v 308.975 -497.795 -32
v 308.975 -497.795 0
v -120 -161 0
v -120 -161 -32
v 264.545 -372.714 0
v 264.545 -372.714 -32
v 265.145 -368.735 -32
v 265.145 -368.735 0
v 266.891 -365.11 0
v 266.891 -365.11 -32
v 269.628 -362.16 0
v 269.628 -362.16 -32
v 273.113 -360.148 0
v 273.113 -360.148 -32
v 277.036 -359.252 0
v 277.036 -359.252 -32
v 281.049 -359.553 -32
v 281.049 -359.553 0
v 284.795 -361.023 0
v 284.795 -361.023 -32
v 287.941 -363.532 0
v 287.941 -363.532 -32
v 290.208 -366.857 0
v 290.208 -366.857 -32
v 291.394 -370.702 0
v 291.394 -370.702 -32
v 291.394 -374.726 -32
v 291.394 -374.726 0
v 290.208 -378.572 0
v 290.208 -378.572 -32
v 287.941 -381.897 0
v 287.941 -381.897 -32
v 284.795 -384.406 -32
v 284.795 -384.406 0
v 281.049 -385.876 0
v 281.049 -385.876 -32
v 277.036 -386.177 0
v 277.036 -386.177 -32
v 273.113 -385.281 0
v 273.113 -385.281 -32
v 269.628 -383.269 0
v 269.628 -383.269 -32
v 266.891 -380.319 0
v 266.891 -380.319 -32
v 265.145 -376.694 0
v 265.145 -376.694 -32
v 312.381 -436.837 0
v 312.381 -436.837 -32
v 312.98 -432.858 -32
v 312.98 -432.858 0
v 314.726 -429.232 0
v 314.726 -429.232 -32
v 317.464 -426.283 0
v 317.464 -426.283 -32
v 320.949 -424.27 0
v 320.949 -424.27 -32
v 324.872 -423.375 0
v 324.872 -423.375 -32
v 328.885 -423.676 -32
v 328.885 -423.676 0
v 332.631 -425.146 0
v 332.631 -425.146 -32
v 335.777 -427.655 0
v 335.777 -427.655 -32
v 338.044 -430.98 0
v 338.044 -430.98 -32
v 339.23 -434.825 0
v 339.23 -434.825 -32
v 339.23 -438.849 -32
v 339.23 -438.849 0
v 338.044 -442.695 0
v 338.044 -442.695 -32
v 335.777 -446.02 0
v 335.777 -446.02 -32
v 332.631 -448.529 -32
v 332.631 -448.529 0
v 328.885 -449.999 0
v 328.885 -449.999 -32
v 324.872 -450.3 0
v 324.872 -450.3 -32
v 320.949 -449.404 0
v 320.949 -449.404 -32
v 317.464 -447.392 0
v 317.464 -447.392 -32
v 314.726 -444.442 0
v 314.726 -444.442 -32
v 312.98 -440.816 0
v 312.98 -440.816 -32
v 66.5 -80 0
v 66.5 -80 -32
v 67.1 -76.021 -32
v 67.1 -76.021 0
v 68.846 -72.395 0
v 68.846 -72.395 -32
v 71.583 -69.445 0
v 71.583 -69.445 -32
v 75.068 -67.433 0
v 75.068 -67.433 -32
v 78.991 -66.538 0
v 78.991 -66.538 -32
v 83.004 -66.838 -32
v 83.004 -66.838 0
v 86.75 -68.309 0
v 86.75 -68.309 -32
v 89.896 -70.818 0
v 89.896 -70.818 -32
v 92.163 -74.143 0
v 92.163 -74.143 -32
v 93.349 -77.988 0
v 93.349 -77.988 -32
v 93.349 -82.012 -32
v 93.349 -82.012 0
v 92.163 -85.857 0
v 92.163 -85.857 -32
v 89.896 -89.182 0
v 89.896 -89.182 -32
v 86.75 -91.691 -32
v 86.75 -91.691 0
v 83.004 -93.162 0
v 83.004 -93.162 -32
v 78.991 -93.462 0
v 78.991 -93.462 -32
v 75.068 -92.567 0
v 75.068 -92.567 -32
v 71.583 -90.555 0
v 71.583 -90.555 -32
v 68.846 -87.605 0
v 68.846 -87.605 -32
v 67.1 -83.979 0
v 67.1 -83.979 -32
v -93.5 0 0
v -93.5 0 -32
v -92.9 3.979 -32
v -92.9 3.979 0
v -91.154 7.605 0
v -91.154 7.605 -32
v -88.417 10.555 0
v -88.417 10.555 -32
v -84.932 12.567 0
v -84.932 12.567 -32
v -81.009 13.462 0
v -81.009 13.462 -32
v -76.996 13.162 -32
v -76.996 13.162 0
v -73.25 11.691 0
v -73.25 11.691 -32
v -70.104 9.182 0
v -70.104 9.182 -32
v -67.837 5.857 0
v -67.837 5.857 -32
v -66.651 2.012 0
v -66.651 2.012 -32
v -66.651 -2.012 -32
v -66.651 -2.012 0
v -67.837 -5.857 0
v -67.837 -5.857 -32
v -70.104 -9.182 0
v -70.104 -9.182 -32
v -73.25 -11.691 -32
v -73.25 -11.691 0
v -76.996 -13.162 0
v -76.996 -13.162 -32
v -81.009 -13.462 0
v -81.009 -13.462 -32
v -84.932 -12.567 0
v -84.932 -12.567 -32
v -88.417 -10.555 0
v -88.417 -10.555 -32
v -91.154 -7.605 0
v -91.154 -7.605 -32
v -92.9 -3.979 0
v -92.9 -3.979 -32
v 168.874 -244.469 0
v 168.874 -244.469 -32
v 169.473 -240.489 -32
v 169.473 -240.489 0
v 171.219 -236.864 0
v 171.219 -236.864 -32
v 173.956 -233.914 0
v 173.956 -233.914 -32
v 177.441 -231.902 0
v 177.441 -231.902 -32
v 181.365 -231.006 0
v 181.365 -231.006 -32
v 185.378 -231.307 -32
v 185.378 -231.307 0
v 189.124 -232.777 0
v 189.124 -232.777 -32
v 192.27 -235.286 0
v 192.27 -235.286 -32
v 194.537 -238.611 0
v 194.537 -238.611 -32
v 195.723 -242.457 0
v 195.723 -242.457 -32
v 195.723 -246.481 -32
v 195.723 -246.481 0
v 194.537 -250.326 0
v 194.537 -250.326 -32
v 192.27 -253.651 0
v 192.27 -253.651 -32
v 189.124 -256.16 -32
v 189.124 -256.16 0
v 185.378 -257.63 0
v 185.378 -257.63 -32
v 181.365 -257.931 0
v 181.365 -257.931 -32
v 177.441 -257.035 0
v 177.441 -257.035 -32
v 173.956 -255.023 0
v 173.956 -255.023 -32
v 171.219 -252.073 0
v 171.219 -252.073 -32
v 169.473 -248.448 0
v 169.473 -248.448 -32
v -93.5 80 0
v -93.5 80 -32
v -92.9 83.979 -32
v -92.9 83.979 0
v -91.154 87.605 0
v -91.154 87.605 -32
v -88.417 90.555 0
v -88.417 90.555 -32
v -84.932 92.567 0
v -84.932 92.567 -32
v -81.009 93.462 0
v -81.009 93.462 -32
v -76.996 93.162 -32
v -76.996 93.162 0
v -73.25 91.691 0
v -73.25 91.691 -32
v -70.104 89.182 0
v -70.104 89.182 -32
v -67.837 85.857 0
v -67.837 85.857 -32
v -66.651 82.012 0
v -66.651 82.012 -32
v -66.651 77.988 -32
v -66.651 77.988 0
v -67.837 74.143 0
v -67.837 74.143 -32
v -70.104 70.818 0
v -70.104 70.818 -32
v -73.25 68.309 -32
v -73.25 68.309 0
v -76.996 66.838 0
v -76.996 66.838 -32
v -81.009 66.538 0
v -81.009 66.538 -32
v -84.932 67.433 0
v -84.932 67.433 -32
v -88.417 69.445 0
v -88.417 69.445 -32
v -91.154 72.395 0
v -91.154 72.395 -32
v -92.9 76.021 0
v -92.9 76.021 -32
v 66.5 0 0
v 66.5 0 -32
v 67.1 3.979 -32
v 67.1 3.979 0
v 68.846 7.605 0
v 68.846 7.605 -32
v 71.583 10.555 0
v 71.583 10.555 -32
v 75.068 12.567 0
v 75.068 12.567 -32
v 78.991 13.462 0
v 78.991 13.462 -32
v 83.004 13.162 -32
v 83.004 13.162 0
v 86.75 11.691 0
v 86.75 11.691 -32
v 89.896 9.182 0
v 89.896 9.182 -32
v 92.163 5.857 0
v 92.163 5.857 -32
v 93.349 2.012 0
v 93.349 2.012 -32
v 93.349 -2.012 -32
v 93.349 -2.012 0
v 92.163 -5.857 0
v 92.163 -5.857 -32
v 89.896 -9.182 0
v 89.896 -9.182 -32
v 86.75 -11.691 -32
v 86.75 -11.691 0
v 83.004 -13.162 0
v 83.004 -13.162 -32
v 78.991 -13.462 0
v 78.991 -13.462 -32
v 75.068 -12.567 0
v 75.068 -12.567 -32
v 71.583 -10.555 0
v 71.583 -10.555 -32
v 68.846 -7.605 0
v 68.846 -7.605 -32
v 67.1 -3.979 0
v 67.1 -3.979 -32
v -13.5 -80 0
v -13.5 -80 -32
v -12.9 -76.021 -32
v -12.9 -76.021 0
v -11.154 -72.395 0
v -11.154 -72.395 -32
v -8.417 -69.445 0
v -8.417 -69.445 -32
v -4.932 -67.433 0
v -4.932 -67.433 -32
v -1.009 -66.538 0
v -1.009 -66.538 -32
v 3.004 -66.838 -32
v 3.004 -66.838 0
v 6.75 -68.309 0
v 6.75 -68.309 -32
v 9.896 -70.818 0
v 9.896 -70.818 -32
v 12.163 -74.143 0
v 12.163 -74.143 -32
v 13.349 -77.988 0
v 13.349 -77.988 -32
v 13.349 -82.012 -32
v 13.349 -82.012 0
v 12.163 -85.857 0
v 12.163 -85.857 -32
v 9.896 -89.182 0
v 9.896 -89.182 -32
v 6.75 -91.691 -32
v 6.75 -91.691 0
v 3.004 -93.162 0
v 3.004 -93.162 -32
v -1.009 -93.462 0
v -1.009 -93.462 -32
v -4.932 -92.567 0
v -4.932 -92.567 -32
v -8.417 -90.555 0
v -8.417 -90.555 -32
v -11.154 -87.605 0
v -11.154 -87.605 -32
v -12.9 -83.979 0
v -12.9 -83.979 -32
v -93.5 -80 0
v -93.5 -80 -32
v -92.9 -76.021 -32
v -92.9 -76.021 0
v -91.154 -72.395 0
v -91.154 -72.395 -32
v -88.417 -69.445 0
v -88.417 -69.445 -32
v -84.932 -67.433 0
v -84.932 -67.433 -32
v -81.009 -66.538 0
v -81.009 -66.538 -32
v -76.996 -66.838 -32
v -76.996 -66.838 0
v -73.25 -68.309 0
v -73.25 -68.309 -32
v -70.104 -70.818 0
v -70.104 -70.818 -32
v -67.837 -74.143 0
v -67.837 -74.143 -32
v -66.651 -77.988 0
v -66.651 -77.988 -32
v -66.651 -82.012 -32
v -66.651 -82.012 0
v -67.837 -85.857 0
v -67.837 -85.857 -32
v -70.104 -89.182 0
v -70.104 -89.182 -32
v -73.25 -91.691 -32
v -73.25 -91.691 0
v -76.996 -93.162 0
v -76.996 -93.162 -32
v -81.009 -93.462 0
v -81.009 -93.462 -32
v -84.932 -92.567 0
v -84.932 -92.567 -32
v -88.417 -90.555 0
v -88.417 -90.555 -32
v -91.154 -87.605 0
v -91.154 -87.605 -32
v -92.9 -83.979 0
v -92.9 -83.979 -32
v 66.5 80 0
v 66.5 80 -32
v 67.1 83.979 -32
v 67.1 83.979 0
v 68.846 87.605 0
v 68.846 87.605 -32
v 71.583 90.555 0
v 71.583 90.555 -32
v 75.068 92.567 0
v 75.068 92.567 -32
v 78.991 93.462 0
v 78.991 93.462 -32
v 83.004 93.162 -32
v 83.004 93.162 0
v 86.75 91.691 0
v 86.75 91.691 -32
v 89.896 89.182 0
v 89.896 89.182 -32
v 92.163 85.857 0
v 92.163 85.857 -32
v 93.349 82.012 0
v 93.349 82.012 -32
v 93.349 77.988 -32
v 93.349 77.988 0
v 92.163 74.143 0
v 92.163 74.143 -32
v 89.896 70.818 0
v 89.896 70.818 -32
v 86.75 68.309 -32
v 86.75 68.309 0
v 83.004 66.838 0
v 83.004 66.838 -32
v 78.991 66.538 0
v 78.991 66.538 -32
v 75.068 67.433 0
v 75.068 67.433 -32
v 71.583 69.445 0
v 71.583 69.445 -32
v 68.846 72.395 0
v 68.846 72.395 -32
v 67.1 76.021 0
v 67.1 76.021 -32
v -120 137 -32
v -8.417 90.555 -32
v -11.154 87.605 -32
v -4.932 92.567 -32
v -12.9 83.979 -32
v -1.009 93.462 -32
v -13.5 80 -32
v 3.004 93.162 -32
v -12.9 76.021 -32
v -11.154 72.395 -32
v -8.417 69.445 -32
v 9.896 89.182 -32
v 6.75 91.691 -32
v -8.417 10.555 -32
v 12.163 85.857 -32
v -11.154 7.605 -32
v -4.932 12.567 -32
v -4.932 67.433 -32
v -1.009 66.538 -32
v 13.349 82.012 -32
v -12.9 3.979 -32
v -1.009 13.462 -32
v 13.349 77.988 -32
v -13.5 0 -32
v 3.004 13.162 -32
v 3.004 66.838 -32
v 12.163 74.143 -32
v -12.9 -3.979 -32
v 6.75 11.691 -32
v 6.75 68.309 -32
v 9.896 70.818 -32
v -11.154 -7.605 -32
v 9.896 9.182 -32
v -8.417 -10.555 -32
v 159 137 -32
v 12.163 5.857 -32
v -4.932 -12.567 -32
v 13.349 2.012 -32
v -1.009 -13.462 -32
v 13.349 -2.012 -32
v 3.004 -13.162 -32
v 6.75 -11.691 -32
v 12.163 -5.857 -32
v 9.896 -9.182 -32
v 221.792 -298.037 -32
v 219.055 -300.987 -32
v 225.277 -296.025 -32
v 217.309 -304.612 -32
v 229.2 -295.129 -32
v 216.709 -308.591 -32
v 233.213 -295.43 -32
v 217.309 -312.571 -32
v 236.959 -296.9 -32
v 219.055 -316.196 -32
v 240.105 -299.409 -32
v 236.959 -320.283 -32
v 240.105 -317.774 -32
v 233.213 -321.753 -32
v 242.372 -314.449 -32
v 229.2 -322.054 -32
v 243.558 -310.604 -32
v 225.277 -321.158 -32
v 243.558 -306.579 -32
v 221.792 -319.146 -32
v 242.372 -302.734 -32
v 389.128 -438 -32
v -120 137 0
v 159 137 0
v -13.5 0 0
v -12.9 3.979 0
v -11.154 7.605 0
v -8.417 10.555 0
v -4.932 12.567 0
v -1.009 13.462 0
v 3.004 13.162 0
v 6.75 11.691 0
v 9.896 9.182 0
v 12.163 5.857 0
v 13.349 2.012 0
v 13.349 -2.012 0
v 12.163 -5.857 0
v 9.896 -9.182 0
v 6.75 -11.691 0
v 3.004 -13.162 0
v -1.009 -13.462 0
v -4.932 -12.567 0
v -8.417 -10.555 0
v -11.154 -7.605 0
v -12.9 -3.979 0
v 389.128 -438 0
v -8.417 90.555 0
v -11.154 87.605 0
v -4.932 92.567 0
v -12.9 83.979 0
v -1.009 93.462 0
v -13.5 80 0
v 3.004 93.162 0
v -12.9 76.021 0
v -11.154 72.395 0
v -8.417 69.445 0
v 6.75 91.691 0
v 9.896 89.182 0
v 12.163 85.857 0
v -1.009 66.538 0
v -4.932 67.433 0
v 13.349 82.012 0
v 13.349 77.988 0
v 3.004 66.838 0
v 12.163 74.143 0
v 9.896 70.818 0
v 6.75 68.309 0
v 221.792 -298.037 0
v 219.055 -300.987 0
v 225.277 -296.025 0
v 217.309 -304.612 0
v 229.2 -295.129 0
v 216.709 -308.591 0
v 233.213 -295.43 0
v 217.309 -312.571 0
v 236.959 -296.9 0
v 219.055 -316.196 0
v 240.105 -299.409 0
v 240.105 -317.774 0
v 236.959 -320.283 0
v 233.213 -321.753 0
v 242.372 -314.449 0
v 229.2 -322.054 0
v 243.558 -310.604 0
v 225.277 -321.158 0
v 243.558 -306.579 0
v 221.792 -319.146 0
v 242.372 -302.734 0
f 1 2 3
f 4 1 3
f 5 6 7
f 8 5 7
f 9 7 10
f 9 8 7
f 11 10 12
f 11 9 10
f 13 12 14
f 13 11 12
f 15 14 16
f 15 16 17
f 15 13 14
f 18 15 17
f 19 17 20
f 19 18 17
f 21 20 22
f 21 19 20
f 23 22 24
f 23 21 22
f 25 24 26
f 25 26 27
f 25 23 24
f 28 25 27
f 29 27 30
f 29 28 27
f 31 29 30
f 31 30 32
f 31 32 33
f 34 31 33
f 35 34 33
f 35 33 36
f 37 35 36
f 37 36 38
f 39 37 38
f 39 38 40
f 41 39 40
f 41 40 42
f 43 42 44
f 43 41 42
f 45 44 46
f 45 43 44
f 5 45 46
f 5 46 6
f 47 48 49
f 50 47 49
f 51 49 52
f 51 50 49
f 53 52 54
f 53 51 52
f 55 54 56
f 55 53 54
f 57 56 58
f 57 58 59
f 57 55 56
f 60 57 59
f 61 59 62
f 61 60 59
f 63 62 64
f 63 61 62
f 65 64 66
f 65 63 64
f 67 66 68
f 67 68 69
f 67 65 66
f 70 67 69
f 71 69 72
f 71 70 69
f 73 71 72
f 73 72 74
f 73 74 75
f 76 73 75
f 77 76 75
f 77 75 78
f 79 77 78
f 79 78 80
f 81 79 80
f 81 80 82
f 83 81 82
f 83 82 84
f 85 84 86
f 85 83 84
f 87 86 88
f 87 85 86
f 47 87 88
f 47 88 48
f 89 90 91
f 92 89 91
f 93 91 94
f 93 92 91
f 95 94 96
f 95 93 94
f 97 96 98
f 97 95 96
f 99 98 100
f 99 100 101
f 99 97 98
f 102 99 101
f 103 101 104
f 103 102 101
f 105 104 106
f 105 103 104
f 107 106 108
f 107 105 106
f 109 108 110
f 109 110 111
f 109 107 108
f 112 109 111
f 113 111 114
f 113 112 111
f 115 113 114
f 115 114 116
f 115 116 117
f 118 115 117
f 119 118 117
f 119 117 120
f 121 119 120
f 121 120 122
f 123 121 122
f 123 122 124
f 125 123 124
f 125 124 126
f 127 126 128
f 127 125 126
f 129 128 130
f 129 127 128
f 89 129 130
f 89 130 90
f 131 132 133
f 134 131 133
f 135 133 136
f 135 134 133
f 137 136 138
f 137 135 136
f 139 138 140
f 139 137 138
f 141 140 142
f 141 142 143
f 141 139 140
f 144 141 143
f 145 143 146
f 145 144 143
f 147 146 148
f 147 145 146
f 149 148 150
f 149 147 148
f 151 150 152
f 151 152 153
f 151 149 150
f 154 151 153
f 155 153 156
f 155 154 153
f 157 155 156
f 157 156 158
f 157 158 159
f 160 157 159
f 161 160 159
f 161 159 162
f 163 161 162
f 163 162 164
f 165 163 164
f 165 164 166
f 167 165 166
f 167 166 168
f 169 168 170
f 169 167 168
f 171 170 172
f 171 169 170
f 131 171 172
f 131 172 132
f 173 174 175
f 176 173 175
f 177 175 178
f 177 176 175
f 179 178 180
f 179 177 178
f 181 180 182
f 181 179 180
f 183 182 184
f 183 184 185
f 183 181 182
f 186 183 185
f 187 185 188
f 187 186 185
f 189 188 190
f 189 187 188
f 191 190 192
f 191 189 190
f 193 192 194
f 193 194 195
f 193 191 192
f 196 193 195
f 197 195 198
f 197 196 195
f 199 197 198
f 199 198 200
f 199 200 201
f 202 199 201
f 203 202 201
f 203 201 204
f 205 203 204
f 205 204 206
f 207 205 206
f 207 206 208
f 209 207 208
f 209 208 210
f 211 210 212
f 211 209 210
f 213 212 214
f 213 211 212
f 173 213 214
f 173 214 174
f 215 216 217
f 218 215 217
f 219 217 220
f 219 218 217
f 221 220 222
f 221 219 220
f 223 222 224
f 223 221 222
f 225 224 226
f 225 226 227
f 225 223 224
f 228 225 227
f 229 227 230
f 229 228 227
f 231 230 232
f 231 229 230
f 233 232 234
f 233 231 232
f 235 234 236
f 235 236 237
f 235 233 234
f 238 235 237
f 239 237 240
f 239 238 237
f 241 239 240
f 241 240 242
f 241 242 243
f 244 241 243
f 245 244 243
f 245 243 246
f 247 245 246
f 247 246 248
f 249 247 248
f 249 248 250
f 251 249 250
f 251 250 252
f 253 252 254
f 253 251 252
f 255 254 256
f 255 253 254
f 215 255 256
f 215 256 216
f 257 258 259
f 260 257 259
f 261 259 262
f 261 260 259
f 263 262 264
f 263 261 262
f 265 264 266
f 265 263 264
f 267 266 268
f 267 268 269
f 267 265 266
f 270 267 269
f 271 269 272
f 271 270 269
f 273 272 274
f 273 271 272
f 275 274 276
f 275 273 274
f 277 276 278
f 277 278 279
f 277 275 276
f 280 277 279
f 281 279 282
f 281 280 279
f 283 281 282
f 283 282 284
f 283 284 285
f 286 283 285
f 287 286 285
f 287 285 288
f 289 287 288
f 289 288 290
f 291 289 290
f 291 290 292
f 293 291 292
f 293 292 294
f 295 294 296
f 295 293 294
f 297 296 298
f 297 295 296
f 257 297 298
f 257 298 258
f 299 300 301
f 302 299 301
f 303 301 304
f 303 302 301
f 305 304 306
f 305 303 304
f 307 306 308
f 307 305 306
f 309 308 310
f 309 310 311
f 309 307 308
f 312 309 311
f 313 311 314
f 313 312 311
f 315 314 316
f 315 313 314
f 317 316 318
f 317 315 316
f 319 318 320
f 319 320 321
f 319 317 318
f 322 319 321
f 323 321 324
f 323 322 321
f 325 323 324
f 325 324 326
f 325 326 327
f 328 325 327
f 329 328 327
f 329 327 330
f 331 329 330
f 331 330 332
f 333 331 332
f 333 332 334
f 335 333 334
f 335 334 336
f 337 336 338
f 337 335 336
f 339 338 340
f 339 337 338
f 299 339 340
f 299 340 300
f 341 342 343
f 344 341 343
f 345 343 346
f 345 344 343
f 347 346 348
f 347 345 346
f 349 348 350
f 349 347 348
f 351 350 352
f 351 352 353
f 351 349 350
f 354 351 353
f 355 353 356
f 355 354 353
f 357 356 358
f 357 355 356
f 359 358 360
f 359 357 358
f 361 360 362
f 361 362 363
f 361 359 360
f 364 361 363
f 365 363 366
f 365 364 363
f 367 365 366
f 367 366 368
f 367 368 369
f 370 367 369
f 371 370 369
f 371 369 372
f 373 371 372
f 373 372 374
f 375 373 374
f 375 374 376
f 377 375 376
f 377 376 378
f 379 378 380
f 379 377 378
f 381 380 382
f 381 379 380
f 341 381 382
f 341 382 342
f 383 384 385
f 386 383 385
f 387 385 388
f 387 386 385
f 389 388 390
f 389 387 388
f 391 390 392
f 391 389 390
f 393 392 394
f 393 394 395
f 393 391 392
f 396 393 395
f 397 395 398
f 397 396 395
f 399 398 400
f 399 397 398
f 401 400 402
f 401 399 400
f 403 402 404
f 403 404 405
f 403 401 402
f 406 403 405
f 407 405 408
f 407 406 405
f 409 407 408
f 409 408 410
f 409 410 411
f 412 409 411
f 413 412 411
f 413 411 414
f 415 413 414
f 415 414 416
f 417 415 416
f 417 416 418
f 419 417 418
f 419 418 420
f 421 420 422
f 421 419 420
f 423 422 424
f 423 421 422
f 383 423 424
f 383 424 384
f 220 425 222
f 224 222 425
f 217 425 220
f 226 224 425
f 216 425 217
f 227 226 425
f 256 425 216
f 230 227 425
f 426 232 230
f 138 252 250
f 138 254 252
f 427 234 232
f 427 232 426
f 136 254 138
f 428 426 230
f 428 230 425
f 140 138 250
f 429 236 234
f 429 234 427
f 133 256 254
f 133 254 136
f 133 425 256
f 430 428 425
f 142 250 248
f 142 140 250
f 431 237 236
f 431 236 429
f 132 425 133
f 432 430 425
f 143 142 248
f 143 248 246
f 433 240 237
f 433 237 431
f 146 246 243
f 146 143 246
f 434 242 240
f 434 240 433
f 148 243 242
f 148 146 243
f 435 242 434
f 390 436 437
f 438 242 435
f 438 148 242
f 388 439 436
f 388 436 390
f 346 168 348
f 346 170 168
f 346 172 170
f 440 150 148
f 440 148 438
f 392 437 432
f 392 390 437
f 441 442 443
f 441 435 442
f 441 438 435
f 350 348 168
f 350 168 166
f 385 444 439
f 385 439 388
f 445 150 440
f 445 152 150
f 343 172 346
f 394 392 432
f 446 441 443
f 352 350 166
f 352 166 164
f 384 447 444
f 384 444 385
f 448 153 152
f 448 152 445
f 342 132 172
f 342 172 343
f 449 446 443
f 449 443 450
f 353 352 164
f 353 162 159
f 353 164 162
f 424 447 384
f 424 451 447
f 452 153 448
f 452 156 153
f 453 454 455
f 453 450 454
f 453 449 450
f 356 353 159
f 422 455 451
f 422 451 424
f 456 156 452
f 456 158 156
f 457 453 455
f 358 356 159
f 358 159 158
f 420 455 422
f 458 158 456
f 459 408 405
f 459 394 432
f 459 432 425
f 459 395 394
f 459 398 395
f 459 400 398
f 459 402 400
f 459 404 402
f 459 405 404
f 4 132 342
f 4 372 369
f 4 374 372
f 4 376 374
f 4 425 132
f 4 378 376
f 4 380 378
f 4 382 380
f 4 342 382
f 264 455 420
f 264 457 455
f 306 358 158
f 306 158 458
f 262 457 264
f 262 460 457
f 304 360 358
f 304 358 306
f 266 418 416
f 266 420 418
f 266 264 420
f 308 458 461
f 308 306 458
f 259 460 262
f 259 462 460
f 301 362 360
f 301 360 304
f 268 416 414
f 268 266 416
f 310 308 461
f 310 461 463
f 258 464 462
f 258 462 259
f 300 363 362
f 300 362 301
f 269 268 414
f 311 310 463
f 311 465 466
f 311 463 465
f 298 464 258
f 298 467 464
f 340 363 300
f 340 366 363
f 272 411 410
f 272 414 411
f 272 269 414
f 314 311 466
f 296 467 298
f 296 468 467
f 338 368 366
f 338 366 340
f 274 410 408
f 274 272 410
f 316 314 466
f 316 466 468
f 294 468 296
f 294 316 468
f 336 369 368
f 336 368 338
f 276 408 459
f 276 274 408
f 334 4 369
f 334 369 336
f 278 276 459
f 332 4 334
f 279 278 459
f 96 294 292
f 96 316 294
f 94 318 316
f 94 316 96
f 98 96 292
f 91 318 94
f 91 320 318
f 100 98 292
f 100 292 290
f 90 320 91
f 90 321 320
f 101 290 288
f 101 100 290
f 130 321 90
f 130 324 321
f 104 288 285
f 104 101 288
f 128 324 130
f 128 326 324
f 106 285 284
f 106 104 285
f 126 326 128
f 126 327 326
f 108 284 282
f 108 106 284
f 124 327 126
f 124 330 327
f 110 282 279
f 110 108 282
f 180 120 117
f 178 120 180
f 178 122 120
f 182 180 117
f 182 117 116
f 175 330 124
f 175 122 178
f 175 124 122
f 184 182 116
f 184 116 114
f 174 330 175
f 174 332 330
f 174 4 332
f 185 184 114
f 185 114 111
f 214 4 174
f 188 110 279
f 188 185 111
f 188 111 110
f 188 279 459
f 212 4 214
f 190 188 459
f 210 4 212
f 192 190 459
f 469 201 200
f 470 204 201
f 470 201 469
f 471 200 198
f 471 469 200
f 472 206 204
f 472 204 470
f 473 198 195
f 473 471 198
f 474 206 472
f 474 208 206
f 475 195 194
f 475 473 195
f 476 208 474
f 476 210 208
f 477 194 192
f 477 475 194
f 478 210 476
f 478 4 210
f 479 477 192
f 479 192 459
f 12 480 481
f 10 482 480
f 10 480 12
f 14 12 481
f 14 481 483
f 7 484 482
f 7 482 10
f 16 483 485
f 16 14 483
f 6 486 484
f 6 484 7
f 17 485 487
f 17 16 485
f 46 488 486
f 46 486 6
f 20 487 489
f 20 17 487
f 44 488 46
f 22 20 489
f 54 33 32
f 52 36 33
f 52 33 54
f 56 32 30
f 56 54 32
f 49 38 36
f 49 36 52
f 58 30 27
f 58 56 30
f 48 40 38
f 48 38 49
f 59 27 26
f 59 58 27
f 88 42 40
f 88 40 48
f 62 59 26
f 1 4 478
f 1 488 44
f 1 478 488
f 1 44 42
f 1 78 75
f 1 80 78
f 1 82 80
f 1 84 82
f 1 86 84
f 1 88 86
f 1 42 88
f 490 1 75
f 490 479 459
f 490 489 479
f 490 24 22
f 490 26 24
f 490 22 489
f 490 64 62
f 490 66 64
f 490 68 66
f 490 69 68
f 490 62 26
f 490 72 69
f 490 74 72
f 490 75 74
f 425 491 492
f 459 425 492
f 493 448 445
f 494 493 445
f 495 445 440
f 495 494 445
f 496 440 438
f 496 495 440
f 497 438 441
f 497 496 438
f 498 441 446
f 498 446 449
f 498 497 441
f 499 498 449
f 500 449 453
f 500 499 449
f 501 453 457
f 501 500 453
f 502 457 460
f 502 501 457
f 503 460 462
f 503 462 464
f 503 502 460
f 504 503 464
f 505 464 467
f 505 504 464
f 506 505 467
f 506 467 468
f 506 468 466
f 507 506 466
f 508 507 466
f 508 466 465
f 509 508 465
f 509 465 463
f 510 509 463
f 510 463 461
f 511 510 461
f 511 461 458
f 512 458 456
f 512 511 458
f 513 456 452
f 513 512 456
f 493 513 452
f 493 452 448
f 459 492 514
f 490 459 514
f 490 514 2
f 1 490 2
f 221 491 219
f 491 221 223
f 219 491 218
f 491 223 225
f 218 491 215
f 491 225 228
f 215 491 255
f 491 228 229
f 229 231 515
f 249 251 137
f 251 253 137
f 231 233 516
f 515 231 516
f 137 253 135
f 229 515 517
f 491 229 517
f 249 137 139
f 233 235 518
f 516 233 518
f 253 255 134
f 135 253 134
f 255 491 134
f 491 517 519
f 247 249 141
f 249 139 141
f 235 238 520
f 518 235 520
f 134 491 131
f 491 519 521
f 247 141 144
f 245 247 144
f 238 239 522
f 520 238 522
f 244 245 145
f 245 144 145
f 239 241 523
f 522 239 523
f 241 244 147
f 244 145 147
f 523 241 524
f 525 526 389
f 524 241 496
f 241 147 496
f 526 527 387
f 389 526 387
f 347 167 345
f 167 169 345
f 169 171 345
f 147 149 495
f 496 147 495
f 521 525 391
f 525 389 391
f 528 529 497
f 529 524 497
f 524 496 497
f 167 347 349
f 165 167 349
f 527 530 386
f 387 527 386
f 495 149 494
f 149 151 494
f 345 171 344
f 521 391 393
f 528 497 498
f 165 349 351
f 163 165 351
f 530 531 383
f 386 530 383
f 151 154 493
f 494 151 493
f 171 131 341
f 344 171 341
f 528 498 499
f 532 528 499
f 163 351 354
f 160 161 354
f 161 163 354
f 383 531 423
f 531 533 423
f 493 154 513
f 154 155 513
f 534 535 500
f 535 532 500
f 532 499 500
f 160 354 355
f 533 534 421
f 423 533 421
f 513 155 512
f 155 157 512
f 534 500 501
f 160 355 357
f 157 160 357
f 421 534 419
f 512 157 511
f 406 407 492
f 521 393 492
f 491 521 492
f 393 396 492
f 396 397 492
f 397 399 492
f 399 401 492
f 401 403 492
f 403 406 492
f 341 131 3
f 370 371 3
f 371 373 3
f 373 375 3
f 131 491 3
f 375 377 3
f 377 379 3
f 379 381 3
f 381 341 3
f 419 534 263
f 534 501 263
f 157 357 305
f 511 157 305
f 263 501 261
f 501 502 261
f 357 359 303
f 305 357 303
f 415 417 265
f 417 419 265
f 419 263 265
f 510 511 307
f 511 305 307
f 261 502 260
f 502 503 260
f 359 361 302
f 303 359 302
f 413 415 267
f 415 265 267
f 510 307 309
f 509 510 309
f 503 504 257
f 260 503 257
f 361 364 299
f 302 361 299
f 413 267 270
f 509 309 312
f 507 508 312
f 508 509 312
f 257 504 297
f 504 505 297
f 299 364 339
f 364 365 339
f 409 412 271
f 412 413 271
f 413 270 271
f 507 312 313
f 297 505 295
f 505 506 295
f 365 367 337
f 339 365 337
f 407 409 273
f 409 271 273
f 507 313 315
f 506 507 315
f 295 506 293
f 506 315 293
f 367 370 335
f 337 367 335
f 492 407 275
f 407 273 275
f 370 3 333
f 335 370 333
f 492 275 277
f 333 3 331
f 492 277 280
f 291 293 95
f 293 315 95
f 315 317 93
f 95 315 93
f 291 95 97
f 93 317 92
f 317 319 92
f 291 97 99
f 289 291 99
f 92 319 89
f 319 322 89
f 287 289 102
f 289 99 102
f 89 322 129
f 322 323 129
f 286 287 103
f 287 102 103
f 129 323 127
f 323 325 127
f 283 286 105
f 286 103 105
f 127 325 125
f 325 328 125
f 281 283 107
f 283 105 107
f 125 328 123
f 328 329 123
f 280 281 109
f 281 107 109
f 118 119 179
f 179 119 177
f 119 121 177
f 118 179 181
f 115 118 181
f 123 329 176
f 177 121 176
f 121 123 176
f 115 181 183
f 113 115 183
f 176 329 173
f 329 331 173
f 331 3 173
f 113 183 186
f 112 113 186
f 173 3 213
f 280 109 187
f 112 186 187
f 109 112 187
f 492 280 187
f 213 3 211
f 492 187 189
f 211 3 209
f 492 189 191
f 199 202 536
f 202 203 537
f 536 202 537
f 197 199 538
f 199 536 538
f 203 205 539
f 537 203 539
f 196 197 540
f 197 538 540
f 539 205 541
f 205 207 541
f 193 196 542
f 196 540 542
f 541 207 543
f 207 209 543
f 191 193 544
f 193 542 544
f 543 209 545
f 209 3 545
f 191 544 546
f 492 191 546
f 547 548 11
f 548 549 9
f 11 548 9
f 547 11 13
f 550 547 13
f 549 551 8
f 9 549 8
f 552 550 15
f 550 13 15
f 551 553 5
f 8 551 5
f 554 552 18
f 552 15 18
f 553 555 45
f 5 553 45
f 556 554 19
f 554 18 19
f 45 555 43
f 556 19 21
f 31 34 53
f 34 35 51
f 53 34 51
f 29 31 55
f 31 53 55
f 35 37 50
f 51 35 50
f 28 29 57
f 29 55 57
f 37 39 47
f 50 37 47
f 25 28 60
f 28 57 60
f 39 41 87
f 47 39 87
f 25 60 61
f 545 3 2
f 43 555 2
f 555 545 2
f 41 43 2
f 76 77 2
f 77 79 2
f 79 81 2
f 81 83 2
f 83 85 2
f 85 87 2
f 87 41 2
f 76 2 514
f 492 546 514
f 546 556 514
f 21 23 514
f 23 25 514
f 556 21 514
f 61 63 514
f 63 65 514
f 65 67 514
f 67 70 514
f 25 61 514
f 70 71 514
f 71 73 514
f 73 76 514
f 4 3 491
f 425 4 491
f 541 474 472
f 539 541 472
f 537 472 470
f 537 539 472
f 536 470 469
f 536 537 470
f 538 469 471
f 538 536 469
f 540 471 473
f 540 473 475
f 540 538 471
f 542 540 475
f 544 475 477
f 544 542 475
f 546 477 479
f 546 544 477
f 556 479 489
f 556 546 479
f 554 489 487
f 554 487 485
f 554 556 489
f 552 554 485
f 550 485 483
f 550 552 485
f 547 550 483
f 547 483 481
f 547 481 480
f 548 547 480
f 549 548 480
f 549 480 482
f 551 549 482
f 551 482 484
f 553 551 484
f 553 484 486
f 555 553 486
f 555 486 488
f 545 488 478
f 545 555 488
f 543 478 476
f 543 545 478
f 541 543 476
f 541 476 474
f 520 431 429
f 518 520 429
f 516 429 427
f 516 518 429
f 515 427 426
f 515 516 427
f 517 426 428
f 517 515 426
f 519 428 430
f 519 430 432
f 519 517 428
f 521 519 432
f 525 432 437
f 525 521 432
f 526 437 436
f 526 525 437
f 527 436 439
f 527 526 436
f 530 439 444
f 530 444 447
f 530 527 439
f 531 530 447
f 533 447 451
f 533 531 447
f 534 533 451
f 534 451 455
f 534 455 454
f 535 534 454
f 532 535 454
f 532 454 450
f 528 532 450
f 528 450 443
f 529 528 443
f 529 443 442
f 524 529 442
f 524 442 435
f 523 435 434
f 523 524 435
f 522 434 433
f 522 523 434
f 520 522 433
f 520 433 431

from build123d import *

# Parameters (mm, degrees)
SKETCH_1_R      = 13.5
EXTRUDE_1_DEPTH = 32


with BuildPart() as part:
    # 草图1 → 凸台-拉伸1 (new body)
    with BuildSketch(Plane(origin=(0, 0, 0), x_dir=(1, 0, 0), z_dir=(0, 0, -1))):
        Polygon((-120, 161), (-120, -137), (159, -137), (389.128205194, 438), (308.974573373, 497.794609338), align=None)
        with Locations(Location((0, 0, 0), (0, 0, 180))):
            Circle(SKETCH_1_R, mode=Mode.SUBTRACT)
        with Locations(Location((182.373558482, 244.468577054, 0), (0, 0, 180))):
            Circle(SKETCH_1_R, mode=Mode.SUBTRACT)
        with Locations(Location((230.209245953, 308.59148251, 0), (0, 0, 180))):
            Circle(SKETCH_1_R, mode=Mode.SUBTRACT)
        with Locations(Location((278.044933423, 372.714387967, 0), (0, 0, 180))):
            Circle(SKETCH_1_R, mode=Mode.SUBTRACT)
        with Locations(Location((325.880620894, 436.837293424, 0), (0, 0, 180))):
            Circle(SKETCH_1_R, mode=Mode.SUBTRACT)
        with Locations(Location((-80, 0, 0), (0, 0, 180))):
            Circle(SKETCH_1_R, mode=Mode.SUBTRACT)
        with Locations(Location((80, 0, 0), (0, 0, 180))):
            Circle(SKETCH_1_R, mode=Mode.SUBTRACT)
        with Locations(Location((-80, -80, 0), (0, 0, 180))):
            Circle(SKETCH_1_R, mode=Mode.SUBTRACT)
        with Locations(Location((0, -80, 0), (0, 0, 180))):
            Circle(SKETCH_1_R, mode=Mode.SUBTRACT)
        with Locations(Location((80, -80, 0), (0, 0, 180))):
            Circle(SKETCH_1_R, mode=Mode.SUBTRACT)
        with Locations(Location((-80, 80, 0), (0, 0, 180))):
            Circle(SKETCH_1_R, mode=Mode.SUBTRACT)
        with Locations(Location((0, 80, 0), (0, 0, 180))):
            Circle(SKETCH_1_R, mode=Mode.SUBTRACT)
        with Locations(Location((80, 80, 0), (0, 0, 180))):
            Circle(SKETCH_1_R, mode=Mode.SUBTRACT)
    extrude(amount=EXTRUDE_1_DEPTH)


solid = part.part
